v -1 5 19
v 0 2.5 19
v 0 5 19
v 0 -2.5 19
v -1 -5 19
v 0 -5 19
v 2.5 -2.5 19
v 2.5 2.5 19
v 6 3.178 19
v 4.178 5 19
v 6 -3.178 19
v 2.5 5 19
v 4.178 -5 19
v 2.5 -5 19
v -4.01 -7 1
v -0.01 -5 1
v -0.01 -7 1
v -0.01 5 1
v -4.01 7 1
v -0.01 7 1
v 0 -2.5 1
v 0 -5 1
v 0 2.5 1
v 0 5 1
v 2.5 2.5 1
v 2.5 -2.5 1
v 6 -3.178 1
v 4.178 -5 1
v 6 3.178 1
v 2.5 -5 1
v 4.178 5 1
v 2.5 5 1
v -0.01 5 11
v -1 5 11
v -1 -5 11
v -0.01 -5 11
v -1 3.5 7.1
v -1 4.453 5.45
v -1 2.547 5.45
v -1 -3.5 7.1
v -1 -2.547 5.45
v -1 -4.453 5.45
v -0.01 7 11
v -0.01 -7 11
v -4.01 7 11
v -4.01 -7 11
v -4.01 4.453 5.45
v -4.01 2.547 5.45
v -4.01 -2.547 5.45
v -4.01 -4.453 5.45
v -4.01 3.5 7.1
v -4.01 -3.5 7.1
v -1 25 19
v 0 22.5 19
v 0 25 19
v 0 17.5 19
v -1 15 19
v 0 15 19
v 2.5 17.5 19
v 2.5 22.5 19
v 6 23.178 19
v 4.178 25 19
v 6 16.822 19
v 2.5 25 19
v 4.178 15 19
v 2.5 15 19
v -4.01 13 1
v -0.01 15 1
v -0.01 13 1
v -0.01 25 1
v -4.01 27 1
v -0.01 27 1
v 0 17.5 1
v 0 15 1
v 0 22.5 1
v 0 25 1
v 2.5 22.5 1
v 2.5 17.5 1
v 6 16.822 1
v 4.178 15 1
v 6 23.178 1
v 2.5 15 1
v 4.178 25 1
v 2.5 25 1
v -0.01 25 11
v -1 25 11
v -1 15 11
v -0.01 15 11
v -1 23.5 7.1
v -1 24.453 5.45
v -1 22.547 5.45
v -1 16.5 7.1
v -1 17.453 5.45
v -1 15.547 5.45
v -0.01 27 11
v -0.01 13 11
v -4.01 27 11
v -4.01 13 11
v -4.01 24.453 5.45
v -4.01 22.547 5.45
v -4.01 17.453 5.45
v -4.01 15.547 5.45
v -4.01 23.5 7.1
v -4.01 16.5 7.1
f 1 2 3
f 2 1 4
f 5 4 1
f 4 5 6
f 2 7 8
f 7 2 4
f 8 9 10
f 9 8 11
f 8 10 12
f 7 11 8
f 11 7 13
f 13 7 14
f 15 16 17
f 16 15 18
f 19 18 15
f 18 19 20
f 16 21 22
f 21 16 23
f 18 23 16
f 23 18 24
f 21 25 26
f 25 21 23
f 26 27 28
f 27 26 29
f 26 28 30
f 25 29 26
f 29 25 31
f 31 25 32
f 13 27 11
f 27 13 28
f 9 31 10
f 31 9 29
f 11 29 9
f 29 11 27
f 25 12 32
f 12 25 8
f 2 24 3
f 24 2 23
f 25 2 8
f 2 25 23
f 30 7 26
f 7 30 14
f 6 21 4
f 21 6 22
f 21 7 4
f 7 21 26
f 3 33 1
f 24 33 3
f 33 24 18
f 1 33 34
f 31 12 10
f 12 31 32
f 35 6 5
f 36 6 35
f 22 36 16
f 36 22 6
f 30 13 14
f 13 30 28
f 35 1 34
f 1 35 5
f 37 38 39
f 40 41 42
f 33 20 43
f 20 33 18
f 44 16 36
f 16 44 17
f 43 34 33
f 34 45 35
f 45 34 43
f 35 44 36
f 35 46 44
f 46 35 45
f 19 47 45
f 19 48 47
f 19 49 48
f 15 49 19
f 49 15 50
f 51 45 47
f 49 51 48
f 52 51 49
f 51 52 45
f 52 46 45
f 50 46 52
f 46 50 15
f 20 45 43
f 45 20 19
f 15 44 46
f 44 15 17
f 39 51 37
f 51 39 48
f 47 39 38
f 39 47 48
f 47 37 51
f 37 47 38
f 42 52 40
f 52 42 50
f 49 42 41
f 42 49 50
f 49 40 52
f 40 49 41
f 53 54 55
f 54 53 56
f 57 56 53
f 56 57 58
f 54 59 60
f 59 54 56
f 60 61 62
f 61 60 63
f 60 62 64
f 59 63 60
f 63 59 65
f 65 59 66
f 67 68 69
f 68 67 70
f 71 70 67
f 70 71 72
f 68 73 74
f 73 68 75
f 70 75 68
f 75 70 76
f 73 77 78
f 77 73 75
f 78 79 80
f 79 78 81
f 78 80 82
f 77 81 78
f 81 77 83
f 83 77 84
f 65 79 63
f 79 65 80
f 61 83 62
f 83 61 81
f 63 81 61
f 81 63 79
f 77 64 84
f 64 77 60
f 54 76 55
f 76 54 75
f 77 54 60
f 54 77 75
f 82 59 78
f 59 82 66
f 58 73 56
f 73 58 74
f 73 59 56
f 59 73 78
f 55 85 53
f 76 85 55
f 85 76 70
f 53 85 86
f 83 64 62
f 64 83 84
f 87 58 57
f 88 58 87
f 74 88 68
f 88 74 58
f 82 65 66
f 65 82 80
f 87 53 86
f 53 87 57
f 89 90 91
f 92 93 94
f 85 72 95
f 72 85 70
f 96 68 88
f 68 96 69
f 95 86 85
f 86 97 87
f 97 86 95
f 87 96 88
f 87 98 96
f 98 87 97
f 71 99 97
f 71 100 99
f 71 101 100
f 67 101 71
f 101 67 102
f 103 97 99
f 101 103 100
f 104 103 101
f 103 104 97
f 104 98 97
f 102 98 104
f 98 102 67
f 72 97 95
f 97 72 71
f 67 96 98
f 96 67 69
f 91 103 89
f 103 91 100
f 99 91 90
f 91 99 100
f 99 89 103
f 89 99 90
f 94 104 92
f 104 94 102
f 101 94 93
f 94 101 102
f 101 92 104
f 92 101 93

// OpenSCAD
// To use, print 2x and use with a switch like D2F-L or D2F-FL.
// Holes are sized for M2 or smaller machine screw (#2 wood screw does not fit
// through microswitch holes).  For use with Grbl shield, wire up X,Y,Z to pins
// D9-D11.  TODO figure out which of normally open or normally closed works
// with firmware.  Note that X and Y use different lengths, see end of file.

// TODOS
// * make h= var do something useful
// * slightly enlarge so it fits snugly and doesn't move around
// * figure out why the hole doesn't go all the way through
// * come up with a plate that has both types
// * document sizing of hole (2.2mm) vs size of screw (down to M1.4)
// * templatize based on something (hopefully total distance + trigger from datasheet)
// * split out profile, so I can use it for other things. Note that this is 20x20 extrusion.

// * cable clip, for if you want to run in the channel
// * version with a tuning fork sort of shape, so a screw can tighten the
//   spacer area (tried something like this once, and it didn't print well --
//   was brittle).

gPlateRows = 1;
gPlateCols = 2;

e = 0.01;

h = 18;
rail_thick = 2.5;

// Set this to 10 if you only want the internal tips trimmed, 40 if you want the outside part to line up too.
tip_trim = 40;

module main() {
  union() {
    difference() {
      bulk();
      // trim exposed part
      translate([-40/2-1,0,0]) cube([40,40,h+2], center=true);
      // mounting hole
      //translate([5,0,h/2-5]) rotate([0,90,0]) cylinder(r1=5.1/2, r2=4/2, h=13, center=true, $fn=30);
    }
    // part the endstop attaches to
    difference() {
      translate([-4/2-e,0,-4]) cube([4,14,10], center=true);
      // mounting holes
      translate([0,7/2,-4]) rotate([0,90,0]) rotate([0,0,180]) cylinder(r=2.2/2, h=30, $fn=3, center=true);
      translate([0,-7/2,-4]) rotate([0,90,0]) rotate([0,0,180]) cylinder(r=2.2/2, h=30, $fn=3, center=true);
    }
  }
}

// This is intentionally untrimmed on the "top" part, so the caller can adjust
// height.
module bulk() {
  difference() {
    translate([-8.5,0,0]) rotate([0,0,45]) cube([25, 25, h], center=true);
    // trim bottom
    translate([24/2+6,0,0]) cube([24, 24, h+2], center=true);

    // trim top (this aligns the left edge with the center line)
    translate([rail_thick/2,12.5,0]) cube([rail_thick,20,h+2], center=true);
    // trim bottom
    translate([rail_thick/2,-12.5,0]) cube([rail_thick,20,h+2], center=true);

    // trim one tip
    translate([5,10,0]) cube([tip_trim,10,h+2], center=true);
    // trim other tip
    translate([5,-10,0]) cube([tip_trim,10,h+2], center=true);
  }
}

difference() {
  union() {
    // place on z=0
    translate([0,0,10])
    for(i = [0:gPlateRows-1]) {
      for(j = [0:gPlateCols-1]) {
        translate([i*20,j*20,0]) main();
      }
    }
  }
  // Trim length of stop varies depending on use (on a Shapeoko):
  // 100/2+15 for y stops
  // 100/2+22 for x stops
  translate([0,0,100/2+22]) cube([100,100,100], center=true);
}
